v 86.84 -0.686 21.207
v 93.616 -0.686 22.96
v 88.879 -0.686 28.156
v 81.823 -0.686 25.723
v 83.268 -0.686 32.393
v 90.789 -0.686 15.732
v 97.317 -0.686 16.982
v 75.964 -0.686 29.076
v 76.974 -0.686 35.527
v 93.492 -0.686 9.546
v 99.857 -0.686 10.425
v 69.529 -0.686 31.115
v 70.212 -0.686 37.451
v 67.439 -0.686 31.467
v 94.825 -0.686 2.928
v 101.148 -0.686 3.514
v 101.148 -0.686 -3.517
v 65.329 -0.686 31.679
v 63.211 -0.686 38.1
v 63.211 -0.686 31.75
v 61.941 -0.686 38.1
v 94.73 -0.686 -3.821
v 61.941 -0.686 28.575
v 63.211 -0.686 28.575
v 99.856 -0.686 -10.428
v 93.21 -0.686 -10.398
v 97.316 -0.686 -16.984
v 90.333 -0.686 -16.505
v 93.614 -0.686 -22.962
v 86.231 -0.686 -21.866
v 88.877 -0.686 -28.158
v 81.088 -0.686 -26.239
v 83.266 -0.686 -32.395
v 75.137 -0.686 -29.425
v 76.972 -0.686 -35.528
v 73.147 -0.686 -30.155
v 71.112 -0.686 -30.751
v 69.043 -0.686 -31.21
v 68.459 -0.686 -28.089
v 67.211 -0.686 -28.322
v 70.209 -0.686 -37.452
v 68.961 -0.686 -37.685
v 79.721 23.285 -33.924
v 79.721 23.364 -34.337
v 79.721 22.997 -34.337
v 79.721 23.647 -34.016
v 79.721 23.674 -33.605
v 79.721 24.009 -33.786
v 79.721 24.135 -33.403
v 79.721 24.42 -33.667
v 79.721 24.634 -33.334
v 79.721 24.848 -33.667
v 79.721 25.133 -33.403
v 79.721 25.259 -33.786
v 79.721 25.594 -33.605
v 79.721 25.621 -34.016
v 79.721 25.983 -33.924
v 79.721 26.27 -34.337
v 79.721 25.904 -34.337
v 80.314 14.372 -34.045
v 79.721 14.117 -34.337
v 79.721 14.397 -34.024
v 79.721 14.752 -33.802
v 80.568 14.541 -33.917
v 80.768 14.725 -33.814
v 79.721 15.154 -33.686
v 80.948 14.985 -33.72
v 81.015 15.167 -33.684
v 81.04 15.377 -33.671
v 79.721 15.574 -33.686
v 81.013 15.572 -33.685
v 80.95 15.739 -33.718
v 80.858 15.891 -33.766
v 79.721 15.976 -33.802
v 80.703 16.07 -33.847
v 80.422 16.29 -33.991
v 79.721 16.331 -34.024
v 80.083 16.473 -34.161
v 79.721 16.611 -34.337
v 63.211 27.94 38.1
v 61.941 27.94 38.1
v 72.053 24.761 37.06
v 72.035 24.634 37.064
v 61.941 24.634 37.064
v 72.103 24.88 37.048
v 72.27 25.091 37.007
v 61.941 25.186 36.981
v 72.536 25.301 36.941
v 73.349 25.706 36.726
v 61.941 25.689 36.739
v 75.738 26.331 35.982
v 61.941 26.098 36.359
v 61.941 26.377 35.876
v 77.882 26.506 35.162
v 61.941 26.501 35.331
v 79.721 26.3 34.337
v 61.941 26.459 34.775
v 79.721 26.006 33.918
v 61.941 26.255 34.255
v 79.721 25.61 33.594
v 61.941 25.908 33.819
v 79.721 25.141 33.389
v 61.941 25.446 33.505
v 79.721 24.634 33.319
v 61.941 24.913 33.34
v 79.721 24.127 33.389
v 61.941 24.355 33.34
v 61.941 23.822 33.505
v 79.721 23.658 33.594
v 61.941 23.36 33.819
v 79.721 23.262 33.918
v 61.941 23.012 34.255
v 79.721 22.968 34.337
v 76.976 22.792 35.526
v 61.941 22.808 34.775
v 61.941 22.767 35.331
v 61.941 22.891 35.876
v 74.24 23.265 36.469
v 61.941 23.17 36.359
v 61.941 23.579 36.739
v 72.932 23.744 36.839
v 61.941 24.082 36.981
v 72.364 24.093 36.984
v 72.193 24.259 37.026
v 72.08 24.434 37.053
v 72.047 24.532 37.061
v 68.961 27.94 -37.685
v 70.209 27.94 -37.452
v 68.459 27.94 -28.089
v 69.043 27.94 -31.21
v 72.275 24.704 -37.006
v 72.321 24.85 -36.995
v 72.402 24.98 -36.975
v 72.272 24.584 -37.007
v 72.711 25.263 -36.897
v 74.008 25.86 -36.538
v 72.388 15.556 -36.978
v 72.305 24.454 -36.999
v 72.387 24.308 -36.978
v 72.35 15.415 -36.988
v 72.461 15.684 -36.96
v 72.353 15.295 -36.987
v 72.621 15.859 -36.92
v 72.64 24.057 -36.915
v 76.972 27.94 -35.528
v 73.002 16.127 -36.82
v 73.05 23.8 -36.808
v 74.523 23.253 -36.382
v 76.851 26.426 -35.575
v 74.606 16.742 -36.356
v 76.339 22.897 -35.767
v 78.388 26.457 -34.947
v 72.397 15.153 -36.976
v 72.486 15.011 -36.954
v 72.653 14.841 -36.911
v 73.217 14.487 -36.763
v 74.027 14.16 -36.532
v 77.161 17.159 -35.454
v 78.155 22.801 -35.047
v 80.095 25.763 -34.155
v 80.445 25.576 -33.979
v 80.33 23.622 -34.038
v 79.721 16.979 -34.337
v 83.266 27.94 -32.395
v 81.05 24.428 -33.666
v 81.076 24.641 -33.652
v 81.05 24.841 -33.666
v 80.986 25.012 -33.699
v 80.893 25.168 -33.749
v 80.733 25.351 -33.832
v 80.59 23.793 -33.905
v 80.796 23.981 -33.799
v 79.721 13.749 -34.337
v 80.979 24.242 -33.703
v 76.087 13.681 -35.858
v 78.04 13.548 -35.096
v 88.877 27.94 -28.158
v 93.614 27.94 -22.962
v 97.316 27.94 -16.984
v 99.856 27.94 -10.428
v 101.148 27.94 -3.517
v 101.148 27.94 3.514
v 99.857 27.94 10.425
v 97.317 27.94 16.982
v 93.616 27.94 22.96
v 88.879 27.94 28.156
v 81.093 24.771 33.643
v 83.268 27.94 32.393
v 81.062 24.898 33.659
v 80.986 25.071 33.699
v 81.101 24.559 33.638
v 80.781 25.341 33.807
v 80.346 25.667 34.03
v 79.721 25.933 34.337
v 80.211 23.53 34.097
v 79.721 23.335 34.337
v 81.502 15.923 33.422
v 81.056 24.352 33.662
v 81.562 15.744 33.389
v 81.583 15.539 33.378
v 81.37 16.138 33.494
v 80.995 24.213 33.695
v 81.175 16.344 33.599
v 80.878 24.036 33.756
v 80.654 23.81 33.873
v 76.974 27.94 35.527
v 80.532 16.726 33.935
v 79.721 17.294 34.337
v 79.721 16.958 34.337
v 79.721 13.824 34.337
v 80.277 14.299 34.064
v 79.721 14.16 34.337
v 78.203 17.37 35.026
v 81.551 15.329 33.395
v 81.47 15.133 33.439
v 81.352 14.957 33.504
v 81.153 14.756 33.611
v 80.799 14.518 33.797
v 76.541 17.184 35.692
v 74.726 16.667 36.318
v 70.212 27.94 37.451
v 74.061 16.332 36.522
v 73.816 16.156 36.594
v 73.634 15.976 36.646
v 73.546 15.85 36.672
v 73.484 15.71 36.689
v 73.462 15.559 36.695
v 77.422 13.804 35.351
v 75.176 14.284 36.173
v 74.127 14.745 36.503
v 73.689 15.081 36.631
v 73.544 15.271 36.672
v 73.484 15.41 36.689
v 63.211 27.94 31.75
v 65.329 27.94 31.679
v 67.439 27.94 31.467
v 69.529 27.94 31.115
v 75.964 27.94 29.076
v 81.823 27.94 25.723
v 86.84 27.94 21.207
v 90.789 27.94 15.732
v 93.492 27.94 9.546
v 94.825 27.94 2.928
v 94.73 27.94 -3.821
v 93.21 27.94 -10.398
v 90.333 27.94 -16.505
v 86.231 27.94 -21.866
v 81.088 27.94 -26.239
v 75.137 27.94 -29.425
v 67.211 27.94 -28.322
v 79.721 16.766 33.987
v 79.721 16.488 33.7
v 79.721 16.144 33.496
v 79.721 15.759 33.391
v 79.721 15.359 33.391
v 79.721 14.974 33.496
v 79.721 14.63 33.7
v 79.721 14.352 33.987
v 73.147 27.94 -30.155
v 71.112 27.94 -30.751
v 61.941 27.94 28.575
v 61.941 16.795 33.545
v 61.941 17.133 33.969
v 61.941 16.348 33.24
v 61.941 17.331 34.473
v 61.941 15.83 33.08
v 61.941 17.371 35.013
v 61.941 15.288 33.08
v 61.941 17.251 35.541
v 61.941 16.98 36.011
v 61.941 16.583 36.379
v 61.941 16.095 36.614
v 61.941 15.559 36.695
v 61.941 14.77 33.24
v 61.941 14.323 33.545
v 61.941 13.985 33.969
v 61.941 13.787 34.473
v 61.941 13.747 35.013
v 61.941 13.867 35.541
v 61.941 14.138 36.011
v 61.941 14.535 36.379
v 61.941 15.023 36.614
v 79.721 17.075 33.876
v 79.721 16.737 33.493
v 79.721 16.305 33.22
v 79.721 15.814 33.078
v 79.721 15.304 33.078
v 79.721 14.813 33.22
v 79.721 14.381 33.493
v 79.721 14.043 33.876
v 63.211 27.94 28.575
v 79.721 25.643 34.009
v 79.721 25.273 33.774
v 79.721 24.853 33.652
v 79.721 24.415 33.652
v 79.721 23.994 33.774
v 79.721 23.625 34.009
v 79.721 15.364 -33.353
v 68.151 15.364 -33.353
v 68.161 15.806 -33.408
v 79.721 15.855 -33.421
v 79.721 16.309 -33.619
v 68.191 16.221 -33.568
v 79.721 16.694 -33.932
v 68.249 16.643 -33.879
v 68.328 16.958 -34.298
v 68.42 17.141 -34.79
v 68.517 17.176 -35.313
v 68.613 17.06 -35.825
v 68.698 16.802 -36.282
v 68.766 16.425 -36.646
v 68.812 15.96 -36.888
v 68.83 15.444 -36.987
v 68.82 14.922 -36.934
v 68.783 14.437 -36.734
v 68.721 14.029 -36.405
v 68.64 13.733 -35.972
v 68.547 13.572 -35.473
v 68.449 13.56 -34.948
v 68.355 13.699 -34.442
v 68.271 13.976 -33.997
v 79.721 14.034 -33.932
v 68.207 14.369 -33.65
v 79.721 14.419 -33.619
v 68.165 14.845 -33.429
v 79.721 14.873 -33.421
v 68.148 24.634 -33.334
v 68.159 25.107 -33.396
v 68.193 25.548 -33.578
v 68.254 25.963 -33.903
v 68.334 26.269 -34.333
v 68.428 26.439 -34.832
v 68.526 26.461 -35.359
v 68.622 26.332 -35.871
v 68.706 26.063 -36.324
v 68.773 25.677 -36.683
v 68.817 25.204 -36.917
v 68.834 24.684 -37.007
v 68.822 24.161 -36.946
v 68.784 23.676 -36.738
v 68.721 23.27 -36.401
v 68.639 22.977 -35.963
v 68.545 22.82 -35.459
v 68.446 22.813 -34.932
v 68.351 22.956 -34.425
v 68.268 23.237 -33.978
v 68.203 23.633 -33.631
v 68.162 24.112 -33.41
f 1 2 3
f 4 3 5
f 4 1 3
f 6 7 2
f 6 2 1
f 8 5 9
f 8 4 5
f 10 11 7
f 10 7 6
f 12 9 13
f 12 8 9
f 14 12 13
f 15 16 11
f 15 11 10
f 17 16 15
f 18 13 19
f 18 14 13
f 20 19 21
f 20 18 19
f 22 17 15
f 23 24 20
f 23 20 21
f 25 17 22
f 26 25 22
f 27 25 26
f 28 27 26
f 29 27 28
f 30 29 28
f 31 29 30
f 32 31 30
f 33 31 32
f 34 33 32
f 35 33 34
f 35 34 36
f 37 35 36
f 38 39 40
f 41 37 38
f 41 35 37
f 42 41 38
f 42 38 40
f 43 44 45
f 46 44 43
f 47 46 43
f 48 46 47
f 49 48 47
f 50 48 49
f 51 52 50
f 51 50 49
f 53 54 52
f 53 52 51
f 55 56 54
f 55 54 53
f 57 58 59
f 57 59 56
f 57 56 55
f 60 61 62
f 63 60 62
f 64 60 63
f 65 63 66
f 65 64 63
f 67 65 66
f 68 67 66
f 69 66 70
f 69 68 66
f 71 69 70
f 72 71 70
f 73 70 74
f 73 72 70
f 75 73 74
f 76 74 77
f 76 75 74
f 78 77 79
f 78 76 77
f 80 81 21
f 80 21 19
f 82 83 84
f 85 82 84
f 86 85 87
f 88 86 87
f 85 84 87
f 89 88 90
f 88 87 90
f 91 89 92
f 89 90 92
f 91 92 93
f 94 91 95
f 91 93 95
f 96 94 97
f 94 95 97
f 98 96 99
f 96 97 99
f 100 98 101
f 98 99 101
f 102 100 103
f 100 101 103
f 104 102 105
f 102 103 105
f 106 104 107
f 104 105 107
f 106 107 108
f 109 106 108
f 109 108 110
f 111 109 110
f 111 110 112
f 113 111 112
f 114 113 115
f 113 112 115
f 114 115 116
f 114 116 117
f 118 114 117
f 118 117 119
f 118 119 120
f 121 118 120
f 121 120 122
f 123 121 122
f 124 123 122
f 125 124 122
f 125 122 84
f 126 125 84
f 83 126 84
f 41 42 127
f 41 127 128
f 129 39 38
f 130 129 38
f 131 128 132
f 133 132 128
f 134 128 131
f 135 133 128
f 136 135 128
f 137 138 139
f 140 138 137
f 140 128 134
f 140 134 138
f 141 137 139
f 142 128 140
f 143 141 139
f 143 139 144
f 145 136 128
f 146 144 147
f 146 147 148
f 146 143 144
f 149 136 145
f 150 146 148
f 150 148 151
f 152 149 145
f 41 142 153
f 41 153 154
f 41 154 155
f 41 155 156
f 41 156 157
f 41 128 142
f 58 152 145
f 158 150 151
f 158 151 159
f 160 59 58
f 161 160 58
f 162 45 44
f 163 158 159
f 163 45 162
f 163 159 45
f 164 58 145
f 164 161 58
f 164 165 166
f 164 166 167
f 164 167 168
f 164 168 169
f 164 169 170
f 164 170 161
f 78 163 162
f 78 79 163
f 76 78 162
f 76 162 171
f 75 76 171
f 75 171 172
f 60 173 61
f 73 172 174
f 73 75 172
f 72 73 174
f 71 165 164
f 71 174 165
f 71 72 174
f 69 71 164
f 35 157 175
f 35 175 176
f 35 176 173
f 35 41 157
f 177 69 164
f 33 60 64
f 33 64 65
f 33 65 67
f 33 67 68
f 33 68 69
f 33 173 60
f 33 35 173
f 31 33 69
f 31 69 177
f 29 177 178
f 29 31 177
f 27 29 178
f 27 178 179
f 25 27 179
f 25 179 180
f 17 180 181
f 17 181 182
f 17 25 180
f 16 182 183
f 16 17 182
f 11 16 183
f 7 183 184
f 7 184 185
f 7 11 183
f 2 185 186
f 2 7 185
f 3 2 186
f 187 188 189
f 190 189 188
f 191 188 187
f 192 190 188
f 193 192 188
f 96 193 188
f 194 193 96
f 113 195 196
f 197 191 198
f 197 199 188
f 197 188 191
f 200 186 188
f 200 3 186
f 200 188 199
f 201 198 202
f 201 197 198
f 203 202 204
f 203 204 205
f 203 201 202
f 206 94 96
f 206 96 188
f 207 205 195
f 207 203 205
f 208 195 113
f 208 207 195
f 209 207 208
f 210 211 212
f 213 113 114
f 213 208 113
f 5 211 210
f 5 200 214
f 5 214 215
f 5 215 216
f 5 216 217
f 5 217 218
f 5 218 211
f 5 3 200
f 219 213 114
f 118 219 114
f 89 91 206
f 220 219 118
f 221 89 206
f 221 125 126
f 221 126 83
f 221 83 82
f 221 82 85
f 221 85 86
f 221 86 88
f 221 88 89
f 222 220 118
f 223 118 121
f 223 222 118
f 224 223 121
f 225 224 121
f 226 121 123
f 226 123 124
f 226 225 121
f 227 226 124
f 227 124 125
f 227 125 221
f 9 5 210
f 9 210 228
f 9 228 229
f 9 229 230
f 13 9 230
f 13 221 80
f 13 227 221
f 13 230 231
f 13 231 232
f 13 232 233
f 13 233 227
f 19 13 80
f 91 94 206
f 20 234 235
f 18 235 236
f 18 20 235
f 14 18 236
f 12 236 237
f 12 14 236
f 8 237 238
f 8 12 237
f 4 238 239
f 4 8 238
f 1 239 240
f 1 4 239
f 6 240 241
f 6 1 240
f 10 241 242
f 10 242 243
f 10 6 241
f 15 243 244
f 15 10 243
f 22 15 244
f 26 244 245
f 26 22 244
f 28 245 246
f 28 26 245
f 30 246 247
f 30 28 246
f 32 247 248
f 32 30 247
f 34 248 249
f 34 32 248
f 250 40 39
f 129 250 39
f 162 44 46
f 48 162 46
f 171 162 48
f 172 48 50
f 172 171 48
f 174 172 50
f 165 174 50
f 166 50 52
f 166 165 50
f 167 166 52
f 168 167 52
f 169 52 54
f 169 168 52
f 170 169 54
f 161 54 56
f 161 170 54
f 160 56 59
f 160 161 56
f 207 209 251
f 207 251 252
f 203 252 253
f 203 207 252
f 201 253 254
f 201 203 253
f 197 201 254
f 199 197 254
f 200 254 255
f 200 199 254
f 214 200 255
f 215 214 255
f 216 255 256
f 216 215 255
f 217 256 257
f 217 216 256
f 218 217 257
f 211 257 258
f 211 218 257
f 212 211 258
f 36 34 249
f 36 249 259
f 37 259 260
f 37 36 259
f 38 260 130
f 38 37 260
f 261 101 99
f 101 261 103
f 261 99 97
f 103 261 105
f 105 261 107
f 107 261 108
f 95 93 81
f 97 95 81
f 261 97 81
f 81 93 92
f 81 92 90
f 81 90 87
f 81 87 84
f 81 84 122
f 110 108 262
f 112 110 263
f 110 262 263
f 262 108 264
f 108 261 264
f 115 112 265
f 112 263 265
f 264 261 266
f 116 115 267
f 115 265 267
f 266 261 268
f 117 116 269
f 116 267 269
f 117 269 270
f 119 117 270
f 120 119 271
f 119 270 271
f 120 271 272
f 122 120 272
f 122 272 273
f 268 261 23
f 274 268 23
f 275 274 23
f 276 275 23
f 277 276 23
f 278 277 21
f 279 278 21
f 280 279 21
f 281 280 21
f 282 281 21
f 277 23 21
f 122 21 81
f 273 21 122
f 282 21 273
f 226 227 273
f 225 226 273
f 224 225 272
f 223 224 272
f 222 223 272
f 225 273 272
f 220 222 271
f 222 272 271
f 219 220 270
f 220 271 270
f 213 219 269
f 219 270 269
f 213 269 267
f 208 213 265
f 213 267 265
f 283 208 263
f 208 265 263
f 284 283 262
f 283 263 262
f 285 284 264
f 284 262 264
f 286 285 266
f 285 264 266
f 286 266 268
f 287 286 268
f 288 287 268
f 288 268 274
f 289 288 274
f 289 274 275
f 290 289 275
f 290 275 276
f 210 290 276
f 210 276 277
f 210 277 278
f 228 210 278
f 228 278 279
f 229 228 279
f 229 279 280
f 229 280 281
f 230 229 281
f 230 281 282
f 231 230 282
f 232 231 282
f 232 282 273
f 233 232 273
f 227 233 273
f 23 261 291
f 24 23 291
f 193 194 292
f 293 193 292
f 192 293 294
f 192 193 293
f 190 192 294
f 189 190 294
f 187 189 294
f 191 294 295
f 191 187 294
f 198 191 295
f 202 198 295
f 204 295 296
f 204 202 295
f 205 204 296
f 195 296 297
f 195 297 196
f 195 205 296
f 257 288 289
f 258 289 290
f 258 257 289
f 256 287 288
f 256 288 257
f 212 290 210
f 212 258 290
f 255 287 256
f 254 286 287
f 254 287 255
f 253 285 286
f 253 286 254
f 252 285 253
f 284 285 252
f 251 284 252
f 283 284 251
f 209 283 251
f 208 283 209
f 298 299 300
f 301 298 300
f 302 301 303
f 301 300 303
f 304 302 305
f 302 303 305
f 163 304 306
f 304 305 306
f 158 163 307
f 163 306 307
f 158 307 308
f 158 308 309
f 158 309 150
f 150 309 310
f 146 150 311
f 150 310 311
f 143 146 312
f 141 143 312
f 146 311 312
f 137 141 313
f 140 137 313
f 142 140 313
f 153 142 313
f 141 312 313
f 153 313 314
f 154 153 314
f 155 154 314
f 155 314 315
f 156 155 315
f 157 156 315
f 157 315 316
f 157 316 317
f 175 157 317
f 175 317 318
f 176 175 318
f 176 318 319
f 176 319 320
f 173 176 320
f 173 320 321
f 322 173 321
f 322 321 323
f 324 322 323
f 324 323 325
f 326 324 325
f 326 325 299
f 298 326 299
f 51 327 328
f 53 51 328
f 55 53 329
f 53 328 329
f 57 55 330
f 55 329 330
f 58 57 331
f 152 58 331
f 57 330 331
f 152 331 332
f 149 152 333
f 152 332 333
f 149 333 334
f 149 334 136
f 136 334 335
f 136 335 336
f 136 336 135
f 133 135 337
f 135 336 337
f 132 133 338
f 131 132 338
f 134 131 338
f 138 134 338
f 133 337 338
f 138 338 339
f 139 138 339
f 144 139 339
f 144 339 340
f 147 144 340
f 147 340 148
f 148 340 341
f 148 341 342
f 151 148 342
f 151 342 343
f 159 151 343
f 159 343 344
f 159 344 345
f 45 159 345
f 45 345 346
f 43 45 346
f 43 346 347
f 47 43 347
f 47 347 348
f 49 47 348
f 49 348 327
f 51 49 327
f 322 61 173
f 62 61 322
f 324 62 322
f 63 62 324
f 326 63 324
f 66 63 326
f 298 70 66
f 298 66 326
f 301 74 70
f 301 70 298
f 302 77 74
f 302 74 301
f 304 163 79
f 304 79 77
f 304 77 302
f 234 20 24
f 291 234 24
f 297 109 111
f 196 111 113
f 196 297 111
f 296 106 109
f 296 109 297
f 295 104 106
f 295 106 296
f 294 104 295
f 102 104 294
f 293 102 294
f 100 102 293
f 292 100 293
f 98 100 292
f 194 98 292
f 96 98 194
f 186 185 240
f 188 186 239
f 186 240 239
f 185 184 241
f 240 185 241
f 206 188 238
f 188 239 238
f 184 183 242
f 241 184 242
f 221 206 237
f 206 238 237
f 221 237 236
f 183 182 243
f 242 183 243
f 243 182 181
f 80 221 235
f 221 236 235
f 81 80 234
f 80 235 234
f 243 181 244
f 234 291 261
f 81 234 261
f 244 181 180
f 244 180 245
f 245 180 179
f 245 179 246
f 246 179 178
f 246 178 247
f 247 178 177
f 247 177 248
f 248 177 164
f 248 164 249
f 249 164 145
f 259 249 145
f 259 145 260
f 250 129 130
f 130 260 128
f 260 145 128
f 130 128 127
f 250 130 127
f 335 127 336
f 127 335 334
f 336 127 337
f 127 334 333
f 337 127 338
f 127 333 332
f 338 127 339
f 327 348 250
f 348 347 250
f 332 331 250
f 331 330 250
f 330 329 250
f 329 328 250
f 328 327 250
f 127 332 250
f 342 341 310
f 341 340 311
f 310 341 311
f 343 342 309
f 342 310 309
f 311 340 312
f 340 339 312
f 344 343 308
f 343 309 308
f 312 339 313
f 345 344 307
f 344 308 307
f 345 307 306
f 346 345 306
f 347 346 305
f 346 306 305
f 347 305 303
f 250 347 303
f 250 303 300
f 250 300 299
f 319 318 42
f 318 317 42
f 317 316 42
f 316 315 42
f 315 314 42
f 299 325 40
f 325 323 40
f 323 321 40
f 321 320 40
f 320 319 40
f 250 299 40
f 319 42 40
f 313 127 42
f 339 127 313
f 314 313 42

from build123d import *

# Parameters (mm, degrees)
BOSS_EXTRUDE1_DEPTH     = 27.94
CUT_EXTRUDE1_DEPTH      = 62.500004065
CUT_EXTRUDE1_DEPTH_BACK = 62.500004065
SKETCH2_R               = 1.5
SKETCH2_R_2             = 1.554918768
SKETCH2_R_3             = 1.519223358
SKETCH2_3_R             = 1.8175
SKETCH2_3_R_2           = 1.5
SKETCH2_3_R_3           = 1.872418768
SKETCH2_3_R_4           = 1.554918768
SKETCH2_3_R_5           = 1.836723358
SKETCH2_3_R_6           = 1.519223358
CUT_EXTRUDE2_DEPTH      = 17.78
BOSS_EXTRUDE2_START     = -0.6858
BOSS_EXTRUDE2_DEPTH     = 0.6858


with BuildPart() as part:
    # Sketch1 → Boss-Extrude1 (new body)
    with BuildSketch(Plane(origin=(0, 0, 0), x_dir=(1, 0, 0), z_dir=(0, 1, 0))):
        with BuildLine():
            ThreePointArc((63.210725521, -38.1), (101.148320659, -3.514096627), (70.208960434, 37.451765087))
            Line((70.208960434, 37.451765087), (68.960568265, 37.685039584))
            Line((68.960568265, 37.685039584), (67.211009536, 28.322098312))
            Line((67.211009536, 28.322098312), (68.459401706, 28.088823815))
            Line((68.459401706, 28.088823815), (69.042587949, 31.209804239))
            ThreePointArc((69.042587949, 31.209804239), (72.134335795, 30.470176889), (75.136623327, 29.425082184))
            ThreePointArc((75.136623327, 29.425082184), (94.374076266, -6.075201259), (63.210725521, -31.75))
            Line((63.210725521, -31.75), (63.210725521, -28.575))
            Line((63.210725521, -28.575), (61.940725521, -28.575))
            Line((61.940725521, -28.575), (61.940725521, -38.1))
            Line((61.940725521, -38.1), (63.210725521, -38.1))
        make_face()
    extrude(amount=BOSS_EXTRUDE1_DEPTH)

    # Sketch2 → Cut-Extrude1 (cut, two sides: drawn at the far end of the back side and taken through both)
    with BuildSketch(Plane.ZY.offset(-61.940725521).offset(-CUT_EXTRUDE1_DEPTH_BACK)):
        with Locations((34.877492102, 15.559033415)):
            Circle(SKETCH2_R)
        with Locations((35.191543991, 24.633934205)):
            Circle(SKETCH2_R_2)
        with Locations((-35.170796856, 24.633934205)):
            Circle(SKETCH2_R_3)
        with Locations((-35.170796856, 15.364007333)):
            Circle(SKETCH2_R)
    extrude(amount=CUT_EXTRUDE1_DEPTH + CUT_EXTRUDE1_DEPTH_BACK, mode=Mode.SUBTRACT)

    # Sketch2<3> → Cut-Extrude2 (cut)
    # profile 1 of 4: a face of its own
    with BuildSketch(Plane.ZY.offset(-61.940725521)):
        with Locations((34.877492102, 15.559033415)):
            Circle(SKETCH2_3_R)
        with Locations((34.877492102, 15.559033415)):
            Circle(SKETCH2_3_R_2, mode=Mode.SUBTRACT)
    # profile 2 of 4: a face of its own
    with BuildSketch(Plane.ZY.offset(-61.940725521)):
        with Locations((35.191543991, 24.633934205)):
            Circle(SKETCH2_3_R_3)
        with Locations((35.191543991, 24.633934205)):
            Circle(SKETCH2_3_R_4, mode=Mode.SUBTRACT)
    # profile 3 of 4: a face of its own
    with BuildSketch(Plane.ZY.offset(-61.940725521)):
        with Locations((-35.170796856, 24.633934205)):
            Circle(SKETCH2_3_R_5)
        with Locations((-35.170796856, 24.633934205)):
            Circle(SKETCH2_3_R_6, mode=Mode.SUBTRACT)
    # profile 4 of 4: a face of its own
    with BuildSketch(Plane.ZY.offset(-61.940725521)):
        with Locations((-35.170796856, 15.364007333)):
            Circle(SKETCH2_3_R)
        with Locations((-35.170796856, 15.364007333)):
            Circle(SKETCH2_3_R_2, mode=Mode.SUBTRACT)
    extrude(amount=-CUT_EXTRUDE2_DEPTH, mode=Mode.SUBTRACT)

    # Sketch1<2> → Boss-Extrude2 (add)
    with BuildSketch(Plane(origin=(0, 0, 0), x_dir=(1, 0, 0), z_dir=(0, 1, 0)).offset(BOSS_EXTRUDE2_START)):
        with BuildLine():
            ThreePointArc((63.210725521, -38.1), (101.148320659, -3.514096627), (70.208960434, 37.451765087))
            Line((70.208960434, 37.451765087), (68.960568265, 37.685039584))
            Line((68.960568265, 37.685039584), (67.211009536, 28.322098312))
            Line((67.211009536, 28.322098312), (68.459401706, 28.088823815))
            Line((68.459401706, 28.088823815), (69.042587949, 31.209804239))
            ThreePointArc((69.042587949, 31.209804239), (72.134335795, 30.470176889), (75.136623327, 29.425082184))
            ThreePointArc((75.136623327, 29.425082184), (94.374076266, -6.075201259), (63.210725521, -31.75))
            Line((63.210725521, -31.75), (63.210725521, -28.575))
            Line((63.210725521, -28.575), (61.940725521, -28.575))
            Line((61.940725521, -28.575), (61.940725521, -38.1))
            Line((61.940725521, -38.1), (63.210725521, -38.1))
        make_face()
    extrude(amount=BOSS_EXTRUDE2_DEPTH)


solid = part.part
